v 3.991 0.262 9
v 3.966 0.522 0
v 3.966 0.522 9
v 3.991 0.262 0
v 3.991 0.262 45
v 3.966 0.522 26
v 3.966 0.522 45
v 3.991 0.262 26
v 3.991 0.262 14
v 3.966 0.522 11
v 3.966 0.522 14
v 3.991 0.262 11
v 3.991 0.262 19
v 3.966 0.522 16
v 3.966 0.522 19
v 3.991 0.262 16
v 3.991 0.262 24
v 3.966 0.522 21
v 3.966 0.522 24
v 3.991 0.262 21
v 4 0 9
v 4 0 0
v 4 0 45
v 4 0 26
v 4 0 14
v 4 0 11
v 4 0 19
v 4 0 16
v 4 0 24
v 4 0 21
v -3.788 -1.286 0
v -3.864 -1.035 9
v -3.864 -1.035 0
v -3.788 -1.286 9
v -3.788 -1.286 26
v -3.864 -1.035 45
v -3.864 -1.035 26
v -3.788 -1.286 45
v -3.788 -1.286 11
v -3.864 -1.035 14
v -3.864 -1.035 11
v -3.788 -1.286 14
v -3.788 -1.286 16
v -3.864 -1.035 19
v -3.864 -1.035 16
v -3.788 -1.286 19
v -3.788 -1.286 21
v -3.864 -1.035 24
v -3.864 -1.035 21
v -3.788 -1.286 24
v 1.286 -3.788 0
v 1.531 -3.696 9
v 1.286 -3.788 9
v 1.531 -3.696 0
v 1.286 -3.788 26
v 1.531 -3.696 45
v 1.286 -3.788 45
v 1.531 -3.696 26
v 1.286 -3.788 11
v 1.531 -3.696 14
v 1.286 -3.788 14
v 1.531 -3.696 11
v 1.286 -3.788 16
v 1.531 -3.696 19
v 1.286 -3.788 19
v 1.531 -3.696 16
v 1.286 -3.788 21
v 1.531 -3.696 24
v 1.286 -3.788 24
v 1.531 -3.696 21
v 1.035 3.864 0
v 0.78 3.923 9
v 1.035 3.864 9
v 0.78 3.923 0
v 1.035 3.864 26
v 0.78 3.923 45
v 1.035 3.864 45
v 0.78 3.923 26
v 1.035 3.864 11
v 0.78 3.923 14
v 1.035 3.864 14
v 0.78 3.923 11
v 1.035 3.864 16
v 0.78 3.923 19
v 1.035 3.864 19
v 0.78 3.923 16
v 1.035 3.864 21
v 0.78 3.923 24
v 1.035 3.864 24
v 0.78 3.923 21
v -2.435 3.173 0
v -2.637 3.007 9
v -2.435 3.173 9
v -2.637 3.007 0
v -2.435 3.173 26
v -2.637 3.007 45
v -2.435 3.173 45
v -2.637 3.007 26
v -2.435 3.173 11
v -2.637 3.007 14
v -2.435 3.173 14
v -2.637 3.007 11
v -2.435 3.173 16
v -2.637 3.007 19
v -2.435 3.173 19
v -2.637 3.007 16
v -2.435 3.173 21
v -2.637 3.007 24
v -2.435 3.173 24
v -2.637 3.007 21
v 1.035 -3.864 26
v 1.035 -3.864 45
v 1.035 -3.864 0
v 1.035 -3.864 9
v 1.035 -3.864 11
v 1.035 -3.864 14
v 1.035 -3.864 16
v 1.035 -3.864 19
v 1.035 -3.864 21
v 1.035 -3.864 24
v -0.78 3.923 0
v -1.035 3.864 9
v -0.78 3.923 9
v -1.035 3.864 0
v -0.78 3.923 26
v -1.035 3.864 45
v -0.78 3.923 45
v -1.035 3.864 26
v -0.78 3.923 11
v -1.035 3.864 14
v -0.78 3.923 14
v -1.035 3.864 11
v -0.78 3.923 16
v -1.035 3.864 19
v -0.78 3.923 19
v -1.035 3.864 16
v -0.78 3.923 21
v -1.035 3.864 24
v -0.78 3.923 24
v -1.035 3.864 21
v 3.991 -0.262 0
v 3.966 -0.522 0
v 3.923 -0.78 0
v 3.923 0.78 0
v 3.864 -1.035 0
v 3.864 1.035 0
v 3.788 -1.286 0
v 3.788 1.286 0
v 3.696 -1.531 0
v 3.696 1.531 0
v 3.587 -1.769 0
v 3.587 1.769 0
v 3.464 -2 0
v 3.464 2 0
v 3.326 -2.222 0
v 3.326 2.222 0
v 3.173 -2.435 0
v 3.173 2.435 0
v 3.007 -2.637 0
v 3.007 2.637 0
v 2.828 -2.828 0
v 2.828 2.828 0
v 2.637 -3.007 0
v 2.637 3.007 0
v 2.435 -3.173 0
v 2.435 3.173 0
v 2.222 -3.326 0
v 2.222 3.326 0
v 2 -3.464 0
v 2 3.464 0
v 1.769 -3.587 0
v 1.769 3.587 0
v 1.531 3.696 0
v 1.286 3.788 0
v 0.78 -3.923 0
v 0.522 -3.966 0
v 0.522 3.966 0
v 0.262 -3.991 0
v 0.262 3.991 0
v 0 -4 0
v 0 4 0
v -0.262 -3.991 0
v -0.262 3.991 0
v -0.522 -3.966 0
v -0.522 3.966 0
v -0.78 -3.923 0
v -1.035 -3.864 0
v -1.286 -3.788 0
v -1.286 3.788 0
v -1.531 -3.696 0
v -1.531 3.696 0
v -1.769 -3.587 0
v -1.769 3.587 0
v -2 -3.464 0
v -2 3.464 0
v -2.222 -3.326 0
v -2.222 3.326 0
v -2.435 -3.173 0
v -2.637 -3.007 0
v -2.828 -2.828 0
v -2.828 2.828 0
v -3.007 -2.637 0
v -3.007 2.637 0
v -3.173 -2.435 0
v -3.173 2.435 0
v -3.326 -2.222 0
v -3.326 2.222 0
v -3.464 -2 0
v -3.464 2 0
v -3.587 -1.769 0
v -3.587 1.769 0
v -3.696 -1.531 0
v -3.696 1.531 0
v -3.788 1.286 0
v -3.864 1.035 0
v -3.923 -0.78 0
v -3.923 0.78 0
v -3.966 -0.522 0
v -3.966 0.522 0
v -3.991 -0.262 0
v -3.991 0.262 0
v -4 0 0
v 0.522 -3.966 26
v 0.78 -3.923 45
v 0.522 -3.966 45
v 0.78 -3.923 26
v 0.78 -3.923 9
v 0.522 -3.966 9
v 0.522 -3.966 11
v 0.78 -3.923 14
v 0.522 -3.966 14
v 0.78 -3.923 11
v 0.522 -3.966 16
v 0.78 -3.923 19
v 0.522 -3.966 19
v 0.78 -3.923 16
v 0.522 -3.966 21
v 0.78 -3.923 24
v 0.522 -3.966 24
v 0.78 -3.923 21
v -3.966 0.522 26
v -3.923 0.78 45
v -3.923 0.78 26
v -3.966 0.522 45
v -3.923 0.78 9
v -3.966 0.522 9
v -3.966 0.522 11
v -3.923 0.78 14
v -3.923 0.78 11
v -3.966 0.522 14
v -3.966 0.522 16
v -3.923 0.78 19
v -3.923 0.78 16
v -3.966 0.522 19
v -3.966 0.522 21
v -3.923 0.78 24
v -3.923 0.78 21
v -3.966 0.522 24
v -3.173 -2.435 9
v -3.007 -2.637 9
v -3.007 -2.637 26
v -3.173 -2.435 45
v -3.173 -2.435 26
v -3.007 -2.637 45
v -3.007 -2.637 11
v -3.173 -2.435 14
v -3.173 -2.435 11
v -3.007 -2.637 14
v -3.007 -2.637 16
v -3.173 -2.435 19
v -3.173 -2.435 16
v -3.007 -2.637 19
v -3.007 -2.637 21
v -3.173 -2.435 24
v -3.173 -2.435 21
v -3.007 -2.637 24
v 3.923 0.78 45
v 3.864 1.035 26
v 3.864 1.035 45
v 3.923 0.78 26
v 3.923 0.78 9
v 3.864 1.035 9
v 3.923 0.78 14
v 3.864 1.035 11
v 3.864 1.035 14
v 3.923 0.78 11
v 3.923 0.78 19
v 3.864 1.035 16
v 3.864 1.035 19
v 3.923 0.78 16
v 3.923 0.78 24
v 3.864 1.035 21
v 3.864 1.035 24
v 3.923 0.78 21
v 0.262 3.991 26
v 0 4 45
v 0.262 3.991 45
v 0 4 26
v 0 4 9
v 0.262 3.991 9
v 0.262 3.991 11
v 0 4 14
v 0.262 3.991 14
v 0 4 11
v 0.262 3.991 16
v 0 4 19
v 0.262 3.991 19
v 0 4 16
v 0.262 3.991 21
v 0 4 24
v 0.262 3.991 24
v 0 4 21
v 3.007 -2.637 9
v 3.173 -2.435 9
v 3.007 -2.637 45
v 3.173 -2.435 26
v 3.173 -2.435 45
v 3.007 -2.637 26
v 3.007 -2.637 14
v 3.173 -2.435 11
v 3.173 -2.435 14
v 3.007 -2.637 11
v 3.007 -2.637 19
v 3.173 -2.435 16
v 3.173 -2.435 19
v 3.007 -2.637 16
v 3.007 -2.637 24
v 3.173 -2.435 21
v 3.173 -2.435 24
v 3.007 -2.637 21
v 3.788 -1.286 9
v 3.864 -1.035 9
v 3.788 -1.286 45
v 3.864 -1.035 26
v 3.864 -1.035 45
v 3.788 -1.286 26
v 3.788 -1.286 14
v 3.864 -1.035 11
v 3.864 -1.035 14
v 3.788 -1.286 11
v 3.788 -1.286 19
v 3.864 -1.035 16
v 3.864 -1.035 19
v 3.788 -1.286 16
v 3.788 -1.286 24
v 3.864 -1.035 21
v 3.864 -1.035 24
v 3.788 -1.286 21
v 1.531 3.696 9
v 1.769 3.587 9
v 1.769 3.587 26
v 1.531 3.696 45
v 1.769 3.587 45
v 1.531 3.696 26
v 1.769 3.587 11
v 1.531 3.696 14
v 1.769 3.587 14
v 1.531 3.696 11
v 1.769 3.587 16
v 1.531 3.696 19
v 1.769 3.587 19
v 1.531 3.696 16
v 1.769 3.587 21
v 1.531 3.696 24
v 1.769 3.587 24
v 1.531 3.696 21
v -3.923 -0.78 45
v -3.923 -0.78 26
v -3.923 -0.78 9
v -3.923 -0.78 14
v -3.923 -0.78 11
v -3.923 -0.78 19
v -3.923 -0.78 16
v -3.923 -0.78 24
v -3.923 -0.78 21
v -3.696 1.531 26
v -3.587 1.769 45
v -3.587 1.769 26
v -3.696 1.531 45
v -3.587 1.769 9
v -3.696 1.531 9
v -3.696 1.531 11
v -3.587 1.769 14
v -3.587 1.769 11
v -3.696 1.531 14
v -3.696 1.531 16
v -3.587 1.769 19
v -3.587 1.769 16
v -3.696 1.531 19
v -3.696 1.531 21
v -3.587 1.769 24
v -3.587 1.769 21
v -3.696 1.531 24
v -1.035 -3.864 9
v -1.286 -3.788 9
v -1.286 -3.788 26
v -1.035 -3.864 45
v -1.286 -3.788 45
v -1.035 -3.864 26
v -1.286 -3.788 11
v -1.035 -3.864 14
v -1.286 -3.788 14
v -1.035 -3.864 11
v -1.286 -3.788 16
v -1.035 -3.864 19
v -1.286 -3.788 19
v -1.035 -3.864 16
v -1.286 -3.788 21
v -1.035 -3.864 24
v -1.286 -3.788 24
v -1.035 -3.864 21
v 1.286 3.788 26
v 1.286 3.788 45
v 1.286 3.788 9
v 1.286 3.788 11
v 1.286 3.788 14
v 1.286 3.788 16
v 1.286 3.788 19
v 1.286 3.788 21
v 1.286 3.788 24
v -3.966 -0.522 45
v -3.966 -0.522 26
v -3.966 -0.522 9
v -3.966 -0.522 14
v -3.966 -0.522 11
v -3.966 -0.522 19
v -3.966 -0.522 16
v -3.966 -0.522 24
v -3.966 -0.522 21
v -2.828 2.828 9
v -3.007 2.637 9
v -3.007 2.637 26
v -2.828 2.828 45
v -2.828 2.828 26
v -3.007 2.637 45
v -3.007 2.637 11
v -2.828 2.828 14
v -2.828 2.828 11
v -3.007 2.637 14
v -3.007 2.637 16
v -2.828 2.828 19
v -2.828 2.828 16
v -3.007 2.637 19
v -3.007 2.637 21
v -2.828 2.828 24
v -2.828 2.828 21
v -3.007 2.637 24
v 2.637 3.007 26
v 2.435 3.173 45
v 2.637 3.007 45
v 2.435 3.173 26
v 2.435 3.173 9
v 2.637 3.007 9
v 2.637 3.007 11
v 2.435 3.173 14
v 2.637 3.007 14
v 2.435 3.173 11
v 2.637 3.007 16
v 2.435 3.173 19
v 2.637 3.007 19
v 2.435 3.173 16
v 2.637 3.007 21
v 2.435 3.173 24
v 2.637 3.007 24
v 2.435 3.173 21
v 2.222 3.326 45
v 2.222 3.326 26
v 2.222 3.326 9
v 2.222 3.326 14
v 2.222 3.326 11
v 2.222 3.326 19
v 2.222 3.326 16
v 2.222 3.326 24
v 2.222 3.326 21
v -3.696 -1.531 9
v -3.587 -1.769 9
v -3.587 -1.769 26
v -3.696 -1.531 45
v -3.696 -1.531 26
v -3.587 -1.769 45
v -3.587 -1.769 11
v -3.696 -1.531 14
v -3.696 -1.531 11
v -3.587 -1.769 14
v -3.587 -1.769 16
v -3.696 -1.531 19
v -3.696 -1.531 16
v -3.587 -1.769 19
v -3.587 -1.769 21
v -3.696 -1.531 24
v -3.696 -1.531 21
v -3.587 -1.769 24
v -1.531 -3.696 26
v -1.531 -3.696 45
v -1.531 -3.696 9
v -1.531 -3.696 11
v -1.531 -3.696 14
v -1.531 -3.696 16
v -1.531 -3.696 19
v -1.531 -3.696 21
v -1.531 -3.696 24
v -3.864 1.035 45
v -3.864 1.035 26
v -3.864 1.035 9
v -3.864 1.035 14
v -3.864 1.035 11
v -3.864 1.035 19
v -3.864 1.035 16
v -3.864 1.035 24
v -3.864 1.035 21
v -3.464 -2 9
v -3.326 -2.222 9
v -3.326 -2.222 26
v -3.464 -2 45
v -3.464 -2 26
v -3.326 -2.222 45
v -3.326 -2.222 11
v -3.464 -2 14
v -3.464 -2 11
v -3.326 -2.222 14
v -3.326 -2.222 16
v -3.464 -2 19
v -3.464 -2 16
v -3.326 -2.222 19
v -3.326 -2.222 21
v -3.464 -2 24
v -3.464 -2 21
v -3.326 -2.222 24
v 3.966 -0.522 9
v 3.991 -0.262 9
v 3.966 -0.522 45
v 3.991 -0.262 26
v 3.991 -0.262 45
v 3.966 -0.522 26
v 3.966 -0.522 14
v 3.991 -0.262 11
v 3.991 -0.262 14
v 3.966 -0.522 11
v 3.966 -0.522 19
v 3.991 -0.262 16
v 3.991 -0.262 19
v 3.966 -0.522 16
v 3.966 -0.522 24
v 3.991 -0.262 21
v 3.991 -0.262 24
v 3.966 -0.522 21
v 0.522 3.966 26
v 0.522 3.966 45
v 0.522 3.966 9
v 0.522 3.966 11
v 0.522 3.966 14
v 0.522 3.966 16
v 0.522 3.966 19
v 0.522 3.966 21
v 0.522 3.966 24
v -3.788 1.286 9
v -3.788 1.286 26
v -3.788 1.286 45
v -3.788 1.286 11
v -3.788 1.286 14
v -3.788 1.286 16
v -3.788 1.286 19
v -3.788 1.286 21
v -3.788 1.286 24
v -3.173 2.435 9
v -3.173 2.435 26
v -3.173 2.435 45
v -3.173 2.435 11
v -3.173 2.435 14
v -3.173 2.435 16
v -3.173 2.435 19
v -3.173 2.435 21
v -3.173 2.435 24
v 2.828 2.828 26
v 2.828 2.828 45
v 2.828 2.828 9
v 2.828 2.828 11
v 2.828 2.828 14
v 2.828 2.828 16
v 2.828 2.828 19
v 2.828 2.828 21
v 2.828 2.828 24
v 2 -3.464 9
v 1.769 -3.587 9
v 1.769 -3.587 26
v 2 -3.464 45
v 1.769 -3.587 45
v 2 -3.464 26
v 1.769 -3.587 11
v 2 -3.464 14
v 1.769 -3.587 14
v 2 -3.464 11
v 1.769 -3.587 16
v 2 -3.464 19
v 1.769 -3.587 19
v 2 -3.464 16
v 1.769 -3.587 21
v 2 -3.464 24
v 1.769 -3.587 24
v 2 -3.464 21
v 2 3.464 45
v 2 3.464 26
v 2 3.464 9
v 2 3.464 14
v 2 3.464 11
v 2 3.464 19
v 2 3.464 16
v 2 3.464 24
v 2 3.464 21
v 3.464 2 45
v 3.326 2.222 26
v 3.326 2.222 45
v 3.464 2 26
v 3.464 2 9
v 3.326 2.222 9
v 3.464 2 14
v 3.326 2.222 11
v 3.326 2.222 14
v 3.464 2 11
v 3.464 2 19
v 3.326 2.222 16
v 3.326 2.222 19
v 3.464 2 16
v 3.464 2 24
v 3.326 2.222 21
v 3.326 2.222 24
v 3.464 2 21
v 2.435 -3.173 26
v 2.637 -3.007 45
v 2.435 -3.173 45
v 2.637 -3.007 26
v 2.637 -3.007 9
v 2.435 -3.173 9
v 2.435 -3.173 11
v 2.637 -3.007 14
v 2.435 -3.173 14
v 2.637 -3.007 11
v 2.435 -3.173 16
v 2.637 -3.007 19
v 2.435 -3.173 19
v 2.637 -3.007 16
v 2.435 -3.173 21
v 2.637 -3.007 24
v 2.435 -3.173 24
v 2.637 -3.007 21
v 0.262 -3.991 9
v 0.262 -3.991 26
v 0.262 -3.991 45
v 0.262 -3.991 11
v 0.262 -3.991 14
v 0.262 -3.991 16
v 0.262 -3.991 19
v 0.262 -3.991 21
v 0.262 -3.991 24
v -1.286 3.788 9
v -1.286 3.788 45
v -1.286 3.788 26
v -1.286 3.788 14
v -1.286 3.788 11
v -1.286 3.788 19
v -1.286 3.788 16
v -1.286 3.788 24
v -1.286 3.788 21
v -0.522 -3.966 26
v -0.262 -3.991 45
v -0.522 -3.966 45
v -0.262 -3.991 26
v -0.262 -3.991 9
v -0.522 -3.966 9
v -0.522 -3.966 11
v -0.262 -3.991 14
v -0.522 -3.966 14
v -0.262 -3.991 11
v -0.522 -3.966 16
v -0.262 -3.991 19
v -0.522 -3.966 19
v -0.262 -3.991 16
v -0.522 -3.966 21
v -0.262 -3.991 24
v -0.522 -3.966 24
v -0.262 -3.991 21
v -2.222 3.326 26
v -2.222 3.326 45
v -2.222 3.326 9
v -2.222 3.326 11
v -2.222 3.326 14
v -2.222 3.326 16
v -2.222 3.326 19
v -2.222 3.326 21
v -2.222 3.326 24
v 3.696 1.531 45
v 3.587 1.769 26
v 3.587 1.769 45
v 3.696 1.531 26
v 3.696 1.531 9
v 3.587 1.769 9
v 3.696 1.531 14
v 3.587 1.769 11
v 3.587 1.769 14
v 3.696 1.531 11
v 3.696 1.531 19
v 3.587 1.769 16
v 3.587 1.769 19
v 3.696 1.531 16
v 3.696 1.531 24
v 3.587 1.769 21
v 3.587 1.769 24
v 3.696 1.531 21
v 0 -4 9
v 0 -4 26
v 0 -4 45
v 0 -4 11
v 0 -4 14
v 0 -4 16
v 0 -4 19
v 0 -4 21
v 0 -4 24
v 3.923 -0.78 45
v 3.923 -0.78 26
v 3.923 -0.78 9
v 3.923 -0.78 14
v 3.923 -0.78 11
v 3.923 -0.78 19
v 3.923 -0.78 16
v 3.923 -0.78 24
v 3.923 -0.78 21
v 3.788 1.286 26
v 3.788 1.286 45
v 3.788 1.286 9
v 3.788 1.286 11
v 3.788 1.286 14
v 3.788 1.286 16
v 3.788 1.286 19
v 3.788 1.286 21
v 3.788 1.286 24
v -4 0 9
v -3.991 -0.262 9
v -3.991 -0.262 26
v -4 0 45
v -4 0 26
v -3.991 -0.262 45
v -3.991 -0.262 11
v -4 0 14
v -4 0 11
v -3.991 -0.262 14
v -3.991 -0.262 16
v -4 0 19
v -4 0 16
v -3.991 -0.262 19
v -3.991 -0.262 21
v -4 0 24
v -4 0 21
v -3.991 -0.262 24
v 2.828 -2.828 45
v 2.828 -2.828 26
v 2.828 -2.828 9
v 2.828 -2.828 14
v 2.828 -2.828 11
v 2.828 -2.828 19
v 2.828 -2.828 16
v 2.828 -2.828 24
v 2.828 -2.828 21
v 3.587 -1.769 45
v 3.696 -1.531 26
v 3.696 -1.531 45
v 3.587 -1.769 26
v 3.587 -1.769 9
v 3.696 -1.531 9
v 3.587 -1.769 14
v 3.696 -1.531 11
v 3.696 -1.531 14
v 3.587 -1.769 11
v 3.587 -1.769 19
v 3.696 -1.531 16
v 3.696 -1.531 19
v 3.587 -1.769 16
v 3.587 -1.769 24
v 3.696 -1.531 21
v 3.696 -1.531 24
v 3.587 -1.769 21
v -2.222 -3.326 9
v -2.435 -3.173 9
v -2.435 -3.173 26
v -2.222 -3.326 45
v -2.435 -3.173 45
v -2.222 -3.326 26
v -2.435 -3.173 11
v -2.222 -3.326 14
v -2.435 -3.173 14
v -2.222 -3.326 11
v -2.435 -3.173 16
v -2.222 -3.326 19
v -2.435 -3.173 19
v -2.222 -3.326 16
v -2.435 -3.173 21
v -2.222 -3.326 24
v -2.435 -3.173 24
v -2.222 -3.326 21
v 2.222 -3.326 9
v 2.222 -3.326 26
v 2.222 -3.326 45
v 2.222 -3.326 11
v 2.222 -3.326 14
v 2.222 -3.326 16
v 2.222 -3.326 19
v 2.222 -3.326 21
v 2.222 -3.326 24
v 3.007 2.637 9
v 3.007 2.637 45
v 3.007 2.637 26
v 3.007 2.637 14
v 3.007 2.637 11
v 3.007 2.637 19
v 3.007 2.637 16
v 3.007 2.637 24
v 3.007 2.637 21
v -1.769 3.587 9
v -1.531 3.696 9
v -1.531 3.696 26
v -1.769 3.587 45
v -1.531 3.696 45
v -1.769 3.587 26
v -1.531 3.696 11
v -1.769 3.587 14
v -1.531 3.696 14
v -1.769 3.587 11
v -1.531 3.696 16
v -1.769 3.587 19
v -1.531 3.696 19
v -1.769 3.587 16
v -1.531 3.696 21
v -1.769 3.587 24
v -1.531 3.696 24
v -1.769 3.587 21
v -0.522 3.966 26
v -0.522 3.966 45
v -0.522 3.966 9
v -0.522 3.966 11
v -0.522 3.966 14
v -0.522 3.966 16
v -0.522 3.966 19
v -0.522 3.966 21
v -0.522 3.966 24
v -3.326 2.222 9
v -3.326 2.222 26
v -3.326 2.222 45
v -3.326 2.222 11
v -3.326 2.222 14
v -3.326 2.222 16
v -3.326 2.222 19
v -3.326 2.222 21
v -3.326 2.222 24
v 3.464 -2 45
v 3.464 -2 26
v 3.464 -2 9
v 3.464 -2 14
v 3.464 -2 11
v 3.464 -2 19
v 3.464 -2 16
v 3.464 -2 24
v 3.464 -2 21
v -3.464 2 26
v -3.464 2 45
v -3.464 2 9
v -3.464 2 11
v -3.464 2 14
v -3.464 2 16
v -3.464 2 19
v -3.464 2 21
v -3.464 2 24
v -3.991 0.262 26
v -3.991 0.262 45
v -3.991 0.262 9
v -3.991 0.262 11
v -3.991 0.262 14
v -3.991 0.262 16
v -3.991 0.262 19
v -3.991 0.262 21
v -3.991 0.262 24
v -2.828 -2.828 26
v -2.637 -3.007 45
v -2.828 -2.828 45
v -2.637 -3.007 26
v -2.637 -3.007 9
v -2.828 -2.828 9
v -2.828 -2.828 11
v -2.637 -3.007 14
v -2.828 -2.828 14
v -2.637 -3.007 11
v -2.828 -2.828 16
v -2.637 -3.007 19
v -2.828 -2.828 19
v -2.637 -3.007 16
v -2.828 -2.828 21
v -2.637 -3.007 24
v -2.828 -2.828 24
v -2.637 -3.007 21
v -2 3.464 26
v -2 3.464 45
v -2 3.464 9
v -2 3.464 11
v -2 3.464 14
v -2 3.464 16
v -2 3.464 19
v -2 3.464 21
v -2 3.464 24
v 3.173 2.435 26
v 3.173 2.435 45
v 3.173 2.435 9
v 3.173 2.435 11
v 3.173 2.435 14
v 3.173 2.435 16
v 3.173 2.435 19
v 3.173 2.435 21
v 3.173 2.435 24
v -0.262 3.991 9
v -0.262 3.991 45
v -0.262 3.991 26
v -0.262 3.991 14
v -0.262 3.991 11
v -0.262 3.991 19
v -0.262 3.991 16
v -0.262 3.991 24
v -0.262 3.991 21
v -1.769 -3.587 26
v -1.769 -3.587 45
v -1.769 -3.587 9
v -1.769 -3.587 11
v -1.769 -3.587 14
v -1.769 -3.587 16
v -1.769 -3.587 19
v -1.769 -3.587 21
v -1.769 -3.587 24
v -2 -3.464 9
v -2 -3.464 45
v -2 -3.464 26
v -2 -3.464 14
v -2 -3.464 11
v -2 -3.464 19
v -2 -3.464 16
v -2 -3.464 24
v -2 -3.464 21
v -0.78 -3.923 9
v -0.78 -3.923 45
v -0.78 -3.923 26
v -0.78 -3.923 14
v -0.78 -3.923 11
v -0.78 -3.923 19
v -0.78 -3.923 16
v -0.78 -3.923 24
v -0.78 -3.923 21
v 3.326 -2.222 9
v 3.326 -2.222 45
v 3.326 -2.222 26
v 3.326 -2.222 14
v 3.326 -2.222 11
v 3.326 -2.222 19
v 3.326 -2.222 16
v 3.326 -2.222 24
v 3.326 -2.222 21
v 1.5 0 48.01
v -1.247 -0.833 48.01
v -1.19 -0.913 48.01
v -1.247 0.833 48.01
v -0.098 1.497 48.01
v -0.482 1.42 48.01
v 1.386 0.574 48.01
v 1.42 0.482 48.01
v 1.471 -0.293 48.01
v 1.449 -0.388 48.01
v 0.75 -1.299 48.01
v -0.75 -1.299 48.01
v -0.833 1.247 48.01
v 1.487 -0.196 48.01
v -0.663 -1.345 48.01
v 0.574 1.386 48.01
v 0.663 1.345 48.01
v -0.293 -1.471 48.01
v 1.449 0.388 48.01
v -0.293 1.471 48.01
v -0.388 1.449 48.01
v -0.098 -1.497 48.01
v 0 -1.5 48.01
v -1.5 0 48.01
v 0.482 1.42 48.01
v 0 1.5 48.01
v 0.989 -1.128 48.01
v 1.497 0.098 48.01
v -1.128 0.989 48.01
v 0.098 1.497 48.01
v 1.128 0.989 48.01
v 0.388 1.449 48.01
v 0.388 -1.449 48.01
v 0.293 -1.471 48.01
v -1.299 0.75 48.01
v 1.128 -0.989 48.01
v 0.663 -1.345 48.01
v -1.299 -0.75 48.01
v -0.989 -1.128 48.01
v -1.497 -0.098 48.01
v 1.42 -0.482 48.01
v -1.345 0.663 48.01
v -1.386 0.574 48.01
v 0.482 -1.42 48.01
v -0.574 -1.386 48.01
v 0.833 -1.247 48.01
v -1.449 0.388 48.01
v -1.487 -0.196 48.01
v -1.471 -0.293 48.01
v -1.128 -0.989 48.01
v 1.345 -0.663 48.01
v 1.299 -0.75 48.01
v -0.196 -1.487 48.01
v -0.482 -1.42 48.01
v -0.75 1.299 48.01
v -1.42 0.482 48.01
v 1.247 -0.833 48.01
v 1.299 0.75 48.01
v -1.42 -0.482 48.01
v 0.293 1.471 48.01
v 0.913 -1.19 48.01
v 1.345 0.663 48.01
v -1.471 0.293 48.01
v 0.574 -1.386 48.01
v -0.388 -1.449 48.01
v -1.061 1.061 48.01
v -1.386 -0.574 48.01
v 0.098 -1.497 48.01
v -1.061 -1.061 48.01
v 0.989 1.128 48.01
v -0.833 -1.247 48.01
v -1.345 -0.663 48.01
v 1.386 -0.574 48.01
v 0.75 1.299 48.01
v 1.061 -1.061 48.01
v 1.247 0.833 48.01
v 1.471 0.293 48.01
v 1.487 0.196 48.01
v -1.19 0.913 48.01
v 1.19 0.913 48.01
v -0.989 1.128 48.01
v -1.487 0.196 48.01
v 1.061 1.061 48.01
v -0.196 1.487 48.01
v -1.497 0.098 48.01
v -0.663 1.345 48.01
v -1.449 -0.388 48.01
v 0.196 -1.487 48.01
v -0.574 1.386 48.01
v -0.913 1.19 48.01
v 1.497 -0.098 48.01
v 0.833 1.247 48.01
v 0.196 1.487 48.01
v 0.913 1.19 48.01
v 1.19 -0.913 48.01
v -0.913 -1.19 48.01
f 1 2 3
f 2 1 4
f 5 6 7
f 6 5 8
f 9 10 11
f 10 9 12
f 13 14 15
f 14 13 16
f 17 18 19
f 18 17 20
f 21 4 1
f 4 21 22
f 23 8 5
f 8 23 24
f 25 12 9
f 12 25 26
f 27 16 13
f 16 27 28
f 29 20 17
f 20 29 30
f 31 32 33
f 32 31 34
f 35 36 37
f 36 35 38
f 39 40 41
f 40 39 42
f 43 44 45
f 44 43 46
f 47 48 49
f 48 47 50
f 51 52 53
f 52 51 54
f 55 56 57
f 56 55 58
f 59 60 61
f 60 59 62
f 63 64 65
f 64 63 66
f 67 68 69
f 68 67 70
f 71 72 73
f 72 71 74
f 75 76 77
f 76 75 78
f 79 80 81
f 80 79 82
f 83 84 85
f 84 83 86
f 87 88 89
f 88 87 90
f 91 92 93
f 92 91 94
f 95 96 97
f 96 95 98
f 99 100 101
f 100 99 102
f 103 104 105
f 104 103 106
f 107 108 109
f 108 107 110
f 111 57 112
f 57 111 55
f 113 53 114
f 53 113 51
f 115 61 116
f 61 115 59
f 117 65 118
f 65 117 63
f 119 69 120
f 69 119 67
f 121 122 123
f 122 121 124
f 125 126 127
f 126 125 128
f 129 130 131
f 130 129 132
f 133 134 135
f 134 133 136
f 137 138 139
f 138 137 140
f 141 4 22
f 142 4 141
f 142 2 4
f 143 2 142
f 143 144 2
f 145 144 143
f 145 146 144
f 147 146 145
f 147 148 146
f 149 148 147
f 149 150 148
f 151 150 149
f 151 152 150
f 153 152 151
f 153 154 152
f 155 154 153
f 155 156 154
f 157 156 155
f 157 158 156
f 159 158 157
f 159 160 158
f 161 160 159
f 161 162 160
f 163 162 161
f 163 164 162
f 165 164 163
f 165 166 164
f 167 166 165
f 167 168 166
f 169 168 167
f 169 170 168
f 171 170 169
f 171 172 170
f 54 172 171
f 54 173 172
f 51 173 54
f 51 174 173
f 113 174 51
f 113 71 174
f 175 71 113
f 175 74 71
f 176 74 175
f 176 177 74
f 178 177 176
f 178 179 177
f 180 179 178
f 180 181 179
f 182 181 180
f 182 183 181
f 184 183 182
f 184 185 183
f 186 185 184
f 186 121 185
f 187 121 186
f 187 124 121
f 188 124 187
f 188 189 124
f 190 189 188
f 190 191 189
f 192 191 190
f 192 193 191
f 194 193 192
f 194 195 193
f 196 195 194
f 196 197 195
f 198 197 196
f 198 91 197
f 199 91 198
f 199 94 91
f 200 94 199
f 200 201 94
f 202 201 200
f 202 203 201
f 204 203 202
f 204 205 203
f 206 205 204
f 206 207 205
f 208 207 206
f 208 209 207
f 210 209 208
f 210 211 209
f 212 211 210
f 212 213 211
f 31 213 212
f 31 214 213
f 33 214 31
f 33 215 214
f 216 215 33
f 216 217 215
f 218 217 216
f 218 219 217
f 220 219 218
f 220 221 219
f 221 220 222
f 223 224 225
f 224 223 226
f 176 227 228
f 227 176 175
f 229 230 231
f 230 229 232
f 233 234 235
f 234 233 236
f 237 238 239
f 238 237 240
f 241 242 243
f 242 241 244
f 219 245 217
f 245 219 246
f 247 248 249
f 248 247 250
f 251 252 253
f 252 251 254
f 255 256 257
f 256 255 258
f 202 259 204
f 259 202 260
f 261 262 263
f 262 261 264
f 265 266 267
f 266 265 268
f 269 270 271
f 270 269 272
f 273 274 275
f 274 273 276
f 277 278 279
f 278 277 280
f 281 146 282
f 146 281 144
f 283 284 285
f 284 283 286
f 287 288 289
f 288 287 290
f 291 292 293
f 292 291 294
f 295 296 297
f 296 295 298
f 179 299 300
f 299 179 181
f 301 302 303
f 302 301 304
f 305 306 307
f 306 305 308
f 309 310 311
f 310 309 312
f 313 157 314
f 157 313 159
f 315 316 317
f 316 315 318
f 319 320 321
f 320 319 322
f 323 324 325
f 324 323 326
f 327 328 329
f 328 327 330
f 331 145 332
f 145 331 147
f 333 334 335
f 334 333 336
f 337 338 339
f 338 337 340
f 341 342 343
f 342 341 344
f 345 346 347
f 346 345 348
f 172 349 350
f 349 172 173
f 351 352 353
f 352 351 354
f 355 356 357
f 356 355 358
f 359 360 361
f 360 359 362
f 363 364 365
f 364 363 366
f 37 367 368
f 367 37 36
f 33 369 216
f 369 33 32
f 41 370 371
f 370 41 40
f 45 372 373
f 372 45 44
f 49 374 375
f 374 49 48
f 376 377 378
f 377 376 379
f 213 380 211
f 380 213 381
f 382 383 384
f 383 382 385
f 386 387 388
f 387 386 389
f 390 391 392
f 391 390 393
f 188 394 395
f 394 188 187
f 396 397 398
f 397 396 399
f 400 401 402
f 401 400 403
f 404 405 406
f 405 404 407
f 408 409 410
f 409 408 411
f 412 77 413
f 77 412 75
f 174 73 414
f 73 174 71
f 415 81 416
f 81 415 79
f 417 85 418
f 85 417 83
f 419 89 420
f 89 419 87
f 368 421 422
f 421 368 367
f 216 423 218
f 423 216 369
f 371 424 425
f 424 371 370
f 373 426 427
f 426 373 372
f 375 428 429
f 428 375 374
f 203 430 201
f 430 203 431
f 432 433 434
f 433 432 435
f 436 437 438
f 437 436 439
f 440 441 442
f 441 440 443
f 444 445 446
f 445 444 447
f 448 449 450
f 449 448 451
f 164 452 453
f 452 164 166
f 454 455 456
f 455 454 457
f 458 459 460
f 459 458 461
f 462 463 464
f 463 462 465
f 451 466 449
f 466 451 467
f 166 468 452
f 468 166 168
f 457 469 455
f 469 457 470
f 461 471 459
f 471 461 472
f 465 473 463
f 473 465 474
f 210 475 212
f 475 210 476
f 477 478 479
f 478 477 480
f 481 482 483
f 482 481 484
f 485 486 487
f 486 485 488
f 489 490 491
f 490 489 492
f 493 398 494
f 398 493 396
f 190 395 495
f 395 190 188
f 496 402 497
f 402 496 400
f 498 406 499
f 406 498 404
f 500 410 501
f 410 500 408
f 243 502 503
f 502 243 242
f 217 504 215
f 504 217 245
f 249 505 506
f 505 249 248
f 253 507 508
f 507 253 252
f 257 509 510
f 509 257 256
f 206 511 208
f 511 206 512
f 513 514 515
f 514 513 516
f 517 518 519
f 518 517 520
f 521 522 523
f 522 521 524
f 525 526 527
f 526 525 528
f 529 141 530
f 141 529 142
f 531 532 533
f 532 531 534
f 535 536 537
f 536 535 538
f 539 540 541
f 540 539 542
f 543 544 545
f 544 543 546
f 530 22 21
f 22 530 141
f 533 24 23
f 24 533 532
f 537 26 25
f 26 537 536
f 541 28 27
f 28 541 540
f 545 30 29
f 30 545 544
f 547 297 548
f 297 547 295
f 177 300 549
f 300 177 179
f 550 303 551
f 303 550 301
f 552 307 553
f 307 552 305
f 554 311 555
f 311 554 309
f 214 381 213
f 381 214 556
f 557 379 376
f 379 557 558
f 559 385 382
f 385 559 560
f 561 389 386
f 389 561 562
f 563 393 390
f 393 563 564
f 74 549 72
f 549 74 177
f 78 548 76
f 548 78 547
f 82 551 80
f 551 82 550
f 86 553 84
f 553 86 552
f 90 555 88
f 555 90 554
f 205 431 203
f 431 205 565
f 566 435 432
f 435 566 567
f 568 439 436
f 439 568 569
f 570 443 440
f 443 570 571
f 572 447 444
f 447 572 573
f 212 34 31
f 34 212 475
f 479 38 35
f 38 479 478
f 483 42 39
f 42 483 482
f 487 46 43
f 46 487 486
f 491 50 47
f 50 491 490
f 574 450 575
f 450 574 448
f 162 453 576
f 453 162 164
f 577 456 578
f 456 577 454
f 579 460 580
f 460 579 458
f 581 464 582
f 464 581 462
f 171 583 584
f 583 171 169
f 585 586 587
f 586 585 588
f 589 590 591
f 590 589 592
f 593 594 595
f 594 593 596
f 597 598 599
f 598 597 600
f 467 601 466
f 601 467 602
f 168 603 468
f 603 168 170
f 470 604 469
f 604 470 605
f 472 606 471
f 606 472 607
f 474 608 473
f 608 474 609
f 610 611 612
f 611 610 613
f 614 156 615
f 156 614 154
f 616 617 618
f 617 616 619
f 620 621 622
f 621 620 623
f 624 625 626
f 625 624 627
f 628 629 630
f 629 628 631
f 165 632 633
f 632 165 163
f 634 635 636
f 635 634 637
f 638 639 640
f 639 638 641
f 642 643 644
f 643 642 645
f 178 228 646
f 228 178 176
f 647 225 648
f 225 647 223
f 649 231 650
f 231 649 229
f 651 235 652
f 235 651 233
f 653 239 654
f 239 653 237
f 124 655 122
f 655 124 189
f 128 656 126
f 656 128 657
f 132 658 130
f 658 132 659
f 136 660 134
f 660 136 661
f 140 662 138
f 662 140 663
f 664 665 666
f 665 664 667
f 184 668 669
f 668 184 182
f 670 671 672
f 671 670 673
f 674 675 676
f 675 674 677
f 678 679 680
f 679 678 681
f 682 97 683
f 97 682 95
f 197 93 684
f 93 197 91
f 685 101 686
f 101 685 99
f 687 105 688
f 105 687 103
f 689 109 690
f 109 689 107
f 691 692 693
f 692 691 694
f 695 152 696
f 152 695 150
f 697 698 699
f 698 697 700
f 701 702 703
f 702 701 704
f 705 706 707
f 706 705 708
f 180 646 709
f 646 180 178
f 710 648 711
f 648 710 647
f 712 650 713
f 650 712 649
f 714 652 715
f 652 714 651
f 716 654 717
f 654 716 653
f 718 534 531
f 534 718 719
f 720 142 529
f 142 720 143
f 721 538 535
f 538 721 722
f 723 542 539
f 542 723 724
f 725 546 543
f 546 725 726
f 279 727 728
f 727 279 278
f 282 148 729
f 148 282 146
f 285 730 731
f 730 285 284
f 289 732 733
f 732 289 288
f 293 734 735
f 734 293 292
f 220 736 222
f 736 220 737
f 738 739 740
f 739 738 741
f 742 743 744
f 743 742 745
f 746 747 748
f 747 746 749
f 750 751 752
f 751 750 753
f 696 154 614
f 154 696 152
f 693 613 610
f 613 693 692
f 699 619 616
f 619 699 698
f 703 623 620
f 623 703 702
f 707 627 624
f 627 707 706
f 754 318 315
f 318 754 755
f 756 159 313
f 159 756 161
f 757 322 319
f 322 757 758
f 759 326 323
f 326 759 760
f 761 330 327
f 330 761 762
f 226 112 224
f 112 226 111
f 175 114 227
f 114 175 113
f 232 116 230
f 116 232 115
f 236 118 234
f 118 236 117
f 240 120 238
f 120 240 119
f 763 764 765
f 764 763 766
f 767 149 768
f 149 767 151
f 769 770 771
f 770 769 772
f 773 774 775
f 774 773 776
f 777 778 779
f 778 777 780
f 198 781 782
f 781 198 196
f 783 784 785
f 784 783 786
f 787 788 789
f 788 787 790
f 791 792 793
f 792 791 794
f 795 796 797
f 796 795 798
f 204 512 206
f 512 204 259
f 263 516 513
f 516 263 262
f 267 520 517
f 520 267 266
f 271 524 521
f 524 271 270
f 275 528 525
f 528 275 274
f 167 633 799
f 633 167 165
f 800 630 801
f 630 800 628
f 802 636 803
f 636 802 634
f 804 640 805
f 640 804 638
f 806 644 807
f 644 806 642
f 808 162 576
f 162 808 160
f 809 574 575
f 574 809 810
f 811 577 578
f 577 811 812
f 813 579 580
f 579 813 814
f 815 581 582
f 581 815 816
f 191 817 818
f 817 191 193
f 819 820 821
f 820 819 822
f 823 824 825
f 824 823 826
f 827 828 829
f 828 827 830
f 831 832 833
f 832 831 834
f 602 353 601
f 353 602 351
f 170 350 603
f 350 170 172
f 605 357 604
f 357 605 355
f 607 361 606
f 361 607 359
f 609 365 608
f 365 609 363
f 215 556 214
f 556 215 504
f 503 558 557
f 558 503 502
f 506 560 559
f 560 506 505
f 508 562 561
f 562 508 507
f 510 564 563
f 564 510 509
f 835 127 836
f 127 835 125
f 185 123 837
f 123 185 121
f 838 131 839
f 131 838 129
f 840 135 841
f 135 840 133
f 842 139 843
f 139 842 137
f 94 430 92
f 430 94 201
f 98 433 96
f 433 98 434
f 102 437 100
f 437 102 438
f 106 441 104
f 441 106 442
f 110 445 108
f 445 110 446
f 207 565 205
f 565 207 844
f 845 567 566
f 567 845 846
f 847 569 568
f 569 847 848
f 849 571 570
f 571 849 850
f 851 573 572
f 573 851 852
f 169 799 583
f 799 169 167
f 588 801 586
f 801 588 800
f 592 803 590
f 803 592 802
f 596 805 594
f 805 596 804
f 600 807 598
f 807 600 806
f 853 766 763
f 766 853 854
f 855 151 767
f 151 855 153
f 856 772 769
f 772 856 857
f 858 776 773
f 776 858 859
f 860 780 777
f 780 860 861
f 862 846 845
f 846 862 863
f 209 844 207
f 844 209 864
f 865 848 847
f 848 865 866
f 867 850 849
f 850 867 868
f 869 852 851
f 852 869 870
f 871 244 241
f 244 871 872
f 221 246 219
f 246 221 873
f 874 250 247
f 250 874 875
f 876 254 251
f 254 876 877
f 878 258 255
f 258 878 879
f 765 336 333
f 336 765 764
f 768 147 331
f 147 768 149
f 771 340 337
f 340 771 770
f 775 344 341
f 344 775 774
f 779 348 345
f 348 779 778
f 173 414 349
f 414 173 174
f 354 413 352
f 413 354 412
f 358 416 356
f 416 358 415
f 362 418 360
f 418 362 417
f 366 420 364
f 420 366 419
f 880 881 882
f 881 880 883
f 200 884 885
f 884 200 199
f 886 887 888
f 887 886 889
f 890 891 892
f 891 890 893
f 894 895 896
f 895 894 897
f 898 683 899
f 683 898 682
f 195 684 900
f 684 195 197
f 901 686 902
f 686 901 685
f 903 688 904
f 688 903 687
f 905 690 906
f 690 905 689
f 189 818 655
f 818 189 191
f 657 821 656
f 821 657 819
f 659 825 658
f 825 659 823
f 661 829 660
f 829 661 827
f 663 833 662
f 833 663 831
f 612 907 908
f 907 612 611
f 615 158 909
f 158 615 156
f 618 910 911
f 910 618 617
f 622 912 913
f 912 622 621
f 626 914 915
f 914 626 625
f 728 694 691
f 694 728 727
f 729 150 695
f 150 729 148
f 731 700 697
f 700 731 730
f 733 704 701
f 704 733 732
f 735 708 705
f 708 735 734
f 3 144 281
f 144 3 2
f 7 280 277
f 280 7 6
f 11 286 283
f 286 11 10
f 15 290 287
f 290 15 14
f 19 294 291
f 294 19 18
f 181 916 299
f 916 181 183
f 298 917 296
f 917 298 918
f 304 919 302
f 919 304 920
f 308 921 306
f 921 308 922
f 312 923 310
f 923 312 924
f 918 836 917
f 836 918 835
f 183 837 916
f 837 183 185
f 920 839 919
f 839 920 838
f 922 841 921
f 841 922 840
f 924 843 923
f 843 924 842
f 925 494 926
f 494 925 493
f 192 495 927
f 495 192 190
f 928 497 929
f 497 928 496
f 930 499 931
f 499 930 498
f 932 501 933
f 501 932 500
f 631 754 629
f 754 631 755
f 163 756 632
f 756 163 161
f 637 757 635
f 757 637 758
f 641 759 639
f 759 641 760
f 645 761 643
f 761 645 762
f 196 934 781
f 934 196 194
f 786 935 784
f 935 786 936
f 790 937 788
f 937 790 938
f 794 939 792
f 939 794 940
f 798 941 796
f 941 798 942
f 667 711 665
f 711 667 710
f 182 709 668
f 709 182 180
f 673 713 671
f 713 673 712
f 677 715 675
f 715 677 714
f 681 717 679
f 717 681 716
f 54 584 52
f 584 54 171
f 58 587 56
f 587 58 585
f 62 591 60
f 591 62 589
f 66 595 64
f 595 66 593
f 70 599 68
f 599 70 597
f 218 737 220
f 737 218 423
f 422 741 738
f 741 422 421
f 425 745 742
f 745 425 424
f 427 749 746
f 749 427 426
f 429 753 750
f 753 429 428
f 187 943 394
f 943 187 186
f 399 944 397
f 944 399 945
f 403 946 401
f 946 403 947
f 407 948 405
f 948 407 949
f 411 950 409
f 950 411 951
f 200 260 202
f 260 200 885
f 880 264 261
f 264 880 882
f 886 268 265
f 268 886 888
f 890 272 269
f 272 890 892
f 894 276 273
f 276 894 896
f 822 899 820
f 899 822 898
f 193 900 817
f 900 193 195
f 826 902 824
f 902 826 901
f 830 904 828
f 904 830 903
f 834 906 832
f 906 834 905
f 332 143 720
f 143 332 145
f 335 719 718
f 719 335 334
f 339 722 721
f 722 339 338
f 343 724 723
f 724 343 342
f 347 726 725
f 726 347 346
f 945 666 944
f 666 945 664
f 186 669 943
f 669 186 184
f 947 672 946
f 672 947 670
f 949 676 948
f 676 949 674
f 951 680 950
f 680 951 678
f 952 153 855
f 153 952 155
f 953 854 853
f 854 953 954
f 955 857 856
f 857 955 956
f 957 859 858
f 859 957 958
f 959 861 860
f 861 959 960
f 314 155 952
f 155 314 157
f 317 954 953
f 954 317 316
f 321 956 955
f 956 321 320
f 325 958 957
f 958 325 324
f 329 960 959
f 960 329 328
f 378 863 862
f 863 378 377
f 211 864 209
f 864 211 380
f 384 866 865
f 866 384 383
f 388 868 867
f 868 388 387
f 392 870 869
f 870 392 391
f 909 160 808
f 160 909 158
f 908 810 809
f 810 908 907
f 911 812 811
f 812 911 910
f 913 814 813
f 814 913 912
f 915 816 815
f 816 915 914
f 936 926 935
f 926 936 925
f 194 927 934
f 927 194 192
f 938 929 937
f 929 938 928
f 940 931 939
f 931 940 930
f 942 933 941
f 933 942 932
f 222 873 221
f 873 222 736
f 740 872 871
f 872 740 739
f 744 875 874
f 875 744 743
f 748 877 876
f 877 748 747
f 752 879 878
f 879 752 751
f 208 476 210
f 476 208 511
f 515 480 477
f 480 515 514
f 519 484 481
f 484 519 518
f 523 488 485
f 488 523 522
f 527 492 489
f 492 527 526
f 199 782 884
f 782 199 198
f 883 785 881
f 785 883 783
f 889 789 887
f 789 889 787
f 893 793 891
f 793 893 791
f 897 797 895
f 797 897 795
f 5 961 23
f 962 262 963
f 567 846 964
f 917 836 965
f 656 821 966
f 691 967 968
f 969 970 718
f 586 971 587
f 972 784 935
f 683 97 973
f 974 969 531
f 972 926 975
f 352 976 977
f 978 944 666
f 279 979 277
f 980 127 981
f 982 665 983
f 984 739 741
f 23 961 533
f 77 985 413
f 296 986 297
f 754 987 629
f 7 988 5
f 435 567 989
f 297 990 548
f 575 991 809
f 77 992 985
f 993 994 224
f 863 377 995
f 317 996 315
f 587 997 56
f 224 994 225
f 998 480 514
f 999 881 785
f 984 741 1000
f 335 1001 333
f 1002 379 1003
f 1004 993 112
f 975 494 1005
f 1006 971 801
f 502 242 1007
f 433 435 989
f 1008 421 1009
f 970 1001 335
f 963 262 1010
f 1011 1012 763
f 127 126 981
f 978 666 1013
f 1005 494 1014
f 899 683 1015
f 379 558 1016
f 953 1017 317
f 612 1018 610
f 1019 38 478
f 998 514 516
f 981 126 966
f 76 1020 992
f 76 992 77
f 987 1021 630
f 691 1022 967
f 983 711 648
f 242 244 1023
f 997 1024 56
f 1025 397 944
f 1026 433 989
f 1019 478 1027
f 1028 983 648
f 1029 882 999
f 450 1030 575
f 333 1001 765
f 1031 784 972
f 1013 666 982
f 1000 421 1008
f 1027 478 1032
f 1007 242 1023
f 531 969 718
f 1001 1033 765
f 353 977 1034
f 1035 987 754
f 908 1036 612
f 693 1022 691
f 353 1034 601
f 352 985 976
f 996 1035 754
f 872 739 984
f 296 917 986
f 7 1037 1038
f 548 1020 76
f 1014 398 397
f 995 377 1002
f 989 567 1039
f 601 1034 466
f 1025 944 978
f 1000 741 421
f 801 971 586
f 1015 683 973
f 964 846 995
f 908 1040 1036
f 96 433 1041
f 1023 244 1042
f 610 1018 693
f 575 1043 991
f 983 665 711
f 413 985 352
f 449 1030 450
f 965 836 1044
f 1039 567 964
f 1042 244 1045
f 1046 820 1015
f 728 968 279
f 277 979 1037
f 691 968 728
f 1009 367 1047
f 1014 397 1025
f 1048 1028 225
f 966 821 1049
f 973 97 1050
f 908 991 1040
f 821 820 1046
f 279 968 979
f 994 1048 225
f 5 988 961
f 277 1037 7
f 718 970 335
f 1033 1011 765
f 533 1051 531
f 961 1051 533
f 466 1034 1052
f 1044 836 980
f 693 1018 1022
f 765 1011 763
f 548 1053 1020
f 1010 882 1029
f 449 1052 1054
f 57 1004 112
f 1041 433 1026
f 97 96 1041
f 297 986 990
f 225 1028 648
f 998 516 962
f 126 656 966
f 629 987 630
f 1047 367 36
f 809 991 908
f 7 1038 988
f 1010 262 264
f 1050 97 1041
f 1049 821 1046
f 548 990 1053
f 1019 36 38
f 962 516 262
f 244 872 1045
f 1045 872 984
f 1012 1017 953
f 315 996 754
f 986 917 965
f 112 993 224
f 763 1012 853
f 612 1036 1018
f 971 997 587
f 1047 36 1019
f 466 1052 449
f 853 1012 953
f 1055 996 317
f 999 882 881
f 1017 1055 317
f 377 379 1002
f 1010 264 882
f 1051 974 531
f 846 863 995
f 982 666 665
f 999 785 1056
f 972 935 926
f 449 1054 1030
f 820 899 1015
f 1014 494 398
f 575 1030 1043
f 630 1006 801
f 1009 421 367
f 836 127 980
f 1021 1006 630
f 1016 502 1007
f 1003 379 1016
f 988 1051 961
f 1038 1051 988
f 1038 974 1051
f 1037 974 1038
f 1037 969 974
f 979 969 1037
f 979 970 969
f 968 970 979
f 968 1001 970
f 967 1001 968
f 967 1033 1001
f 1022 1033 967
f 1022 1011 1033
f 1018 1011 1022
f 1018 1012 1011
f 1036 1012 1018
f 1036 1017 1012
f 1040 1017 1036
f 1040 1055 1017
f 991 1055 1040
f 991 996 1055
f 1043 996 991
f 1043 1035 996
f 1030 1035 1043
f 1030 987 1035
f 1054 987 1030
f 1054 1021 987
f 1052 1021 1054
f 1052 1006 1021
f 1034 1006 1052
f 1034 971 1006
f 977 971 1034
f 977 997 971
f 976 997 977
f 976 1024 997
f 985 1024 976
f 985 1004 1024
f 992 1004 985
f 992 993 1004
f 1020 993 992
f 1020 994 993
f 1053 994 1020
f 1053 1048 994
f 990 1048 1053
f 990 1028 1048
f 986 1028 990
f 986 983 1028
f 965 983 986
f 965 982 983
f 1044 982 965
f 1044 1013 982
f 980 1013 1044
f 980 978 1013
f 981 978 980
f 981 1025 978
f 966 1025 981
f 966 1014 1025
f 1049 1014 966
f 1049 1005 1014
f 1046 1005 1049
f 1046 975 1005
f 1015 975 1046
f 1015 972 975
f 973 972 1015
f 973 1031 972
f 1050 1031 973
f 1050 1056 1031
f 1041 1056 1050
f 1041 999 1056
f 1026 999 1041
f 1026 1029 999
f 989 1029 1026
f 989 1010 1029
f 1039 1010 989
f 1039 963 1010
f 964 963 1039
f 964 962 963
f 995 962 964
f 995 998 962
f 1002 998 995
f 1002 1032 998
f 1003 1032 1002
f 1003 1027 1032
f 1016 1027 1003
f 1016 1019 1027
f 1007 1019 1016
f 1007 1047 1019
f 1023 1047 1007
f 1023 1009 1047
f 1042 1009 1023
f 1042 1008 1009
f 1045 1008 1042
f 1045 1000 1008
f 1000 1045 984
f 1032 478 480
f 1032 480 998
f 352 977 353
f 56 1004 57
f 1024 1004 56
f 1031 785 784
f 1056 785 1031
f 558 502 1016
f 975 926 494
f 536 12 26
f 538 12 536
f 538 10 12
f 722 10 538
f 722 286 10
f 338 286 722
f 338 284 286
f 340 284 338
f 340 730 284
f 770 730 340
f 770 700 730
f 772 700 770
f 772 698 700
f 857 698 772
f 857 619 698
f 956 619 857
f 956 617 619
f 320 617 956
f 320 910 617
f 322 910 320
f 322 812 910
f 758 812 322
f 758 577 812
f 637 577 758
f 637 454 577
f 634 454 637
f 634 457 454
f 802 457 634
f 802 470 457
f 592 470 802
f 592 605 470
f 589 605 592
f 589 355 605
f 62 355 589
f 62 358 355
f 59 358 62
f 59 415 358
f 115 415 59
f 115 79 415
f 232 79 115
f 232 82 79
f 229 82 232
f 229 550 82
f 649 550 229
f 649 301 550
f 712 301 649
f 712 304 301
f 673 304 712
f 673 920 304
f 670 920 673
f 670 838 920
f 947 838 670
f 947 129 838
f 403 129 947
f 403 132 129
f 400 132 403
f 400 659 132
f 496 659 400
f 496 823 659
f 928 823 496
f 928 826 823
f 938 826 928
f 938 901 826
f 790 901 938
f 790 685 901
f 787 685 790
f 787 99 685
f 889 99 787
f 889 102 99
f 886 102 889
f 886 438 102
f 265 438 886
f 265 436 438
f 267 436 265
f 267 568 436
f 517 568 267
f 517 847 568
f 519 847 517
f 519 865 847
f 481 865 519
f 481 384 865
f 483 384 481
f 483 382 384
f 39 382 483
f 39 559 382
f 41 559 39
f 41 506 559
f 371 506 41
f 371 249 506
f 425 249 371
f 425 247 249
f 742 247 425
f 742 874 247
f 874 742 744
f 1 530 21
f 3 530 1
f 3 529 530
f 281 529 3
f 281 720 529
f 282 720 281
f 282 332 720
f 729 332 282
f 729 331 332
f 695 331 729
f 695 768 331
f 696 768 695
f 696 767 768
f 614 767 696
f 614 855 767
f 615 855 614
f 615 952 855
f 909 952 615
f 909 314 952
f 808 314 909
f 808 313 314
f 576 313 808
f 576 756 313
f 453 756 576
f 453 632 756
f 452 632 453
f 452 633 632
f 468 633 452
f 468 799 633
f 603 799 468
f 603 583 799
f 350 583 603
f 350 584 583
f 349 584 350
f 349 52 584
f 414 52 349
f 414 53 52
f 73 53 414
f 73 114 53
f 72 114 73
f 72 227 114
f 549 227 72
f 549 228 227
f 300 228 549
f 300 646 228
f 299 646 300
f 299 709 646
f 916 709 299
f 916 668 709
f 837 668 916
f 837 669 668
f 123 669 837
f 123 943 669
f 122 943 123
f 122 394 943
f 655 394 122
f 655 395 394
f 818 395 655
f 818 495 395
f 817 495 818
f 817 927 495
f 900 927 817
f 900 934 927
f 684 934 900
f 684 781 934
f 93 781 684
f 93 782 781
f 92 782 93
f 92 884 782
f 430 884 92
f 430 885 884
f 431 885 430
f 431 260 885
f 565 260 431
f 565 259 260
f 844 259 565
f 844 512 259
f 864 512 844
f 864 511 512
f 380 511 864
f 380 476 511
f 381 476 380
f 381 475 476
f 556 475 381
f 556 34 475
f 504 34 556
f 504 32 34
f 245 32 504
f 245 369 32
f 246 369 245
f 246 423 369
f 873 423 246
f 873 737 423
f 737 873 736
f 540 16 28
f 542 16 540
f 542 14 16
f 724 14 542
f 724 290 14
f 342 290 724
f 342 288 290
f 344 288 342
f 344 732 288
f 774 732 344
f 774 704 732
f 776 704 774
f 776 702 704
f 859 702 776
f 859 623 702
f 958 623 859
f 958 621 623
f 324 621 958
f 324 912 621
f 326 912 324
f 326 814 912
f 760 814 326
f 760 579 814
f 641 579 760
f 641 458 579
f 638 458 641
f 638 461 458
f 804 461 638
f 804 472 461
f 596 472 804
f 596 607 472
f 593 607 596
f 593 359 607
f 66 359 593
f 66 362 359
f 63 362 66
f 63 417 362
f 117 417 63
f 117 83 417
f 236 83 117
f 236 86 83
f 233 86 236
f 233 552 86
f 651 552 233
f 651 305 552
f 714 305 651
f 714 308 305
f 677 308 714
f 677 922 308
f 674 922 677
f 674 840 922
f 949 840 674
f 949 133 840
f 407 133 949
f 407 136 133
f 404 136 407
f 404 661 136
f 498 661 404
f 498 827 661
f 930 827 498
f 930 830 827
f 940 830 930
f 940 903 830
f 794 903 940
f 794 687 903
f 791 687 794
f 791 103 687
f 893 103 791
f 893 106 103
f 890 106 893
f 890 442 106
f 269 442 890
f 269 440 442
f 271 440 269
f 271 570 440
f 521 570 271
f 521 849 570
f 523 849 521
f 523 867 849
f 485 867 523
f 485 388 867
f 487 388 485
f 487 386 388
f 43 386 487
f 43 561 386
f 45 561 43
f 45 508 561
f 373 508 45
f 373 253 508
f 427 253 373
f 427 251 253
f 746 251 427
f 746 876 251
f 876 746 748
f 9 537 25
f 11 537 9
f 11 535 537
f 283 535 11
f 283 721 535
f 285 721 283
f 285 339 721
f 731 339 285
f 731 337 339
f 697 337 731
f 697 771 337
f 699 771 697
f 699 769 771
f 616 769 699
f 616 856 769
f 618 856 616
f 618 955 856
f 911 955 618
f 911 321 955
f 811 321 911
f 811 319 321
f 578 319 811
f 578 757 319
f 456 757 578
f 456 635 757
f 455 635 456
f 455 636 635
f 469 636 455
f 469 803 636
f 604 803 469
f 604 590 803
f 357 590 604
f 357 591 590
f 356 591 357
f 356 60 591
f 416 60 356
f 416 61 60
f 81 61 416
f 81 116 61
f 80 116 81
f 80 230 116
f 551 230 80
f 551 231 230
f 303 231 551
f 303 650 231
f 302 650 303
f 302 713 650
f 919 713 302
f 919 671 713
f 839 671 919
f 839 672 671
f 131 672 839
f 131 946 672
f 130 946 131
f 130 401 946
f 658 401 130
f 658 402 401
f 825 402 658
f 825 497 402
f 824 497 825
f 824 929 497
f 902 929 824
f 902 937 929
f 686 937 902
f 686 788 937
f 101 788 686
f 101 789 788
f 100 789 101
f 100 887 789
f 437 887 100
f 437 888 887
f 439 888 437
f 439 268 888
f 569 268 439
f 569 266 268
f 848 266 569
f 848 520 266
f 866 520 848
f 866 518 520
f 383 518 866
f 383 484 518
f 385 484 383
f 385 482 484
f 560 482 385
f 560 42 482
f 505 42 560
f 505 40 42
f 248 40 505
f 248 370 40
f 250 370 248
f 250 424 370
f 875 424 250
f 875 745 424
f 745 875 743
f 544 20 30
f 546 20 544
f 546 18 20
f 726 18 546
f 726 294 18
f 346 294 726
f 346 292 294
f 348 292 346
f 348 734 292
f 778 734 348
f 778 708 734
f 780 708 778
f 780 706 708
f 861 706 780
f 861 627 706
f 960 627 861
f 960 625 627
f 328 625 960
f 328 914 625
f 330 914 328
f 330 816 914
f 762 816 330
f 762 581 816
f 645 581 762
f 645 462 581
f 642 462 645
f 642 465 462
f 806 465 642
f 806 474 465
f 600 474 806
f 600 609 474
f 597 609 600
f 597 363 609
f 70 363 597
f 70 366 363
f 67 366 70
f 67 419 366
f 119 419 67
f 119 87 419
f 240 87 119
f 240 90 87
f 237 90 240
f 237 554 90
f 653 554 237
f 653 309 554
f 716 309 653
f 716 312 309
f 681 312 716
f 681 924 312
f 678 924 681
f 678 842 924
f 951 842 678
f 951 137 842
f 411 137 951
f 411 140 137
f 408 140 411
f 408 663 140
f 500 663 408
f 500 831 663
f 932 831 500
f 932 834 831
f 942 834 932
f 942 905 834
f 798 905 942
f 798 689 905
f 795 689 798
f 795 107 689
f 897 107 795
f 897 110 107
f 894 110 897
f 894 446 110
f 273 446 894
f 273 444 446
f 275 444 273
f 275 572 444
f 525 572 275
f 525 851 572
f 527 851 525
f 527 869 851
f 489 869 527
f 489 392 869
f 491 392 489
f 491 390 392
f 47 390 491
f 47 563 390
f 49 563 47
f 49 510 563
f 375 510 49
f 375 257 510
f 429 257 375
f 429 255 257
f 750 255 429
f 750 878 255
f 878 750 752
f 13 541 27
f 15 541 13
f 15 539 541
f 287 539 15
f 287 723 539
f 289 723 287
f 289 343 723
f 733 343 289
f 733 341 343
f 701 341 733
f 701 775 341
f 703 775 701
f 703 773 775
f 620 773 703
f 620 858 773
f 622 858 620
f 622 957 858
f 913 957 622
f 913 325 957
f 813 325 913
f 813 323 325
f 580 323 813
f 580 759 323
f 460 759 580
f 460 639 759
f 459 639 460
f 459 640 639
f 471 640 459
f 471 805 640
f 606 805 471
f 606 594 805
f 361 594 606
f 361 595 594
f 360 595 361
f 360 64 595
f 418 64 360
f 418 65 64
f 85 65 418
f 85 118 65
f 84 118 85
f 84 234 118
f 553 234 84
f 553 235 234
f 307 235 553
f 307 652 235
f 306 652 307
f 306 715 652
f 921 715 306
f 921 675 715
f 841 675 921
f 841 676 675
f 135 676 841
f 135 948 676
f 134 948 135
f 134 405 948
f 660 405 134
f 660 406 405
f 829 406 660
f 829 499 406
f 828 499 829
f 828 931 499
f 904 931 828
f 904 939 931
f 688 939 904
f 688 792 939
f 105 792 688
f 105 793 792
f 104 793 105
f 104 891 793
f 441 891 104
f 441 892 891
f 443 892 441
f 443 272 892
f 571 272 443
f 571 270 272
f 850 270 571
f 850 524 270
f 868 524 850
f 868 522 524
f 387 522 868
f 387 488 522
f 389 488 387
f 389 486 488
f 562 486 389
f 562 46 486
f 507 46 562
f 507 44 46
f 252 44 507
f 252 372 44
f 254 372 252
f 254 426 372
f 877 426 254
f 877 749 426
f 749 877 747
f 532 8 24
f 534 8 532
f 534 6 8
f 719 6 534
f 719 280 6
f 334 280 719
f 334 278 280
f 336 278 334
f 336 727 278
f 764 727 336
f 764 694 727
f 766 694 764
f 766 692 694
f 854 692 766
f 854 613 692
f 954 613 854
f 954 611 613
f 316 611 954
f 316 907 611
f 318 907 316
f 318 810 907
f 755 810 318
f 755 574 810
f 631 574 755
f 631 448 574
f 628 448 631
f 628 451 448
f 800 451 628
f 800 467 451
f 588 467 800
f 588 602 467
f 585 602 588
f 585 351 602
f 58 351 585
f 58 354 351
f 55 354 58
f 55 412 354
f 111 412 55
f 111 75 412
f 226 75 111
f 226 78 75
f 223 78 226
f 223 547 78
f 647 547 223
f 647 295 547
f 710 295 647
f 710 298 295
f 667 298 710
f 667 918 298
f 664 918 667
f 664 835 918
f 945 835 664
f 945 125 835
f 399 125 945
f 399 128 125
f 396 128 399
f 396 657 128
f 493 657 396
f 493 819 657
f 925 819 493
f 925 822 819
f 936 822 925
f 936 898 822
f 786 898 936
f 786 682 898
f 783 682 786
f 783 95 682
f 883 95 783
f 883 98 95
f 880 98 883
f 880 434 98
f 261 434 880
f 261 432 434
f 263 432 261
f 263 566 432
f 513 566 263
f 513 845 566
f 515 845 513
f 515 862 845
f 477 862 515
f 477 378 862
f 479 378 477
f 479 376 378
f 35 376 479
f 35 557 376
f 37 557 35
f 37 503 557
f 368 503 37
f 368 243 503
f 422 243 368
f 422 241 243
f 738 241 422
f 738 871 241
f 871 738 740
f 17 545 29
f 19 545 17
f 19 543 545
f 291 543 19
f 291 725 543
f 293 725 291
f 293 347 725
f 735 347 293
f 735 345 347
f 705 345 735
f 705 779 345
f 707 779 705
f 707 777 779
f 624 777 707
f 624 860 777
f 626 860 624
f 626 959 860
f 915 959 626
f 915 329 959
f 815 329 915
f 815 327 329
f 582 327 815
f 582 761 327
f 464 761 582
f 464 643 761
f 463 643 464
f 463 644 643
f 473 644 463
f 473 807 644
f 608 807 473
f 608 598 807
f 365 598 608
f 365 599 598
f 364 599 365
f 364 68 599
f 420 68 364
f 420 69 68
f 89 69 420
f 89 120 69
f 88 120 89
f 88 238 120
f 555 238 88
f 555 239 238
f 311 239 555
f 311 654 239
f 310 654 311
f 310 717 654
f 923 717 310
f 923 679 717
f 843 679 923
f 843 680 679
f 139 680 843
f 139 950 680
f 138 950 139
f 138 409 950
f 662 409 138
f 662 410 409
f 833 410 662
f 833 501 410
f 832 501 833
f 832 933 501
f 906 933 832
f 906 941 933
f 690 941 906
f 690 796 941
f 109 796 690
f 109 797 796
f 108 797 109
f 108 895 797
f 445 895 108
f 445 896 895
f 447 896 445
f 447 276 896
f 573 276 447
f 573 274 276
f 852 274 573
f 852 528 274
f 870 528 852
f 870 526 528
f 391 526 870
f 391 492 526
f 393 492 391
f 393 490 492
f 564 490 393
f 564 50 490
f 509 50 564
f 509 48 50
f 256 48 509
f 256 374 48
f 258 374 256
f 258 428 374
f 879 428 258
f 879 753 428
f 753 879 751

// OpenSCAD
// Pestle for grinding tissue inside a 1.5 mL microcentrifuge tube
// Printed standing upright: handle at the bottom, tip at the top.
//
// Dimensions (mm):
//   handle_d      = 8.00   // handle diameter
//   handle_h      = 45.00  // handle height (z = 0 to 45)
//   cone_bottom_d = 3.00   // cone diameter at z = 62
//   sphere_d      = 3.00   // tip sphere diameter
//   groove_count  = 4      // number of circumferential grooves
//   groove_w      = 2.00   // groove width in Z
//   groove_depth  = 1.00   // groove depth from surface
//   groove_z      = [10, 15, 20, 25] // groove centre heights

// ---------------- Parameters ----------------
handle_d      = 8.0;
handle_h      = 45.0;
cone_bottom_d = 3.0;
sphere_d      = 3.0;
groove_count  = 4;
groove_w      = 2.0;
groove_depth  = 1.0;
groove_z      = [10, 15, 20, 25];

eps = 0.5;      // cutter overshoot past faces (mm)

$fn = 96;

// ---------------- Model ----------------
difference() {
    union() {
        // (1) Cylindrical handle: z = 0 to 45
        cylinder(d = handle_d, h = handle_h);

        // (2) Cone: z = 45 to 62, 8 mm -> 3 mm diameter
        translate([0, 0, handle_h])
            cylinder(d1 = handle_d, d2 = cone_bottom_d, h = sphere_d + 0.01);

        // (3) Rounded tip: sphere centred at z = 62
        translate([0, 0, handle_h + sphere_d / 2])
            sphere(d = sphere_d);
    }

    // Grip grooves
    for (z = groove_z)
        translate([0, 0, z - groove_w / 2])
            cylinder(d = handle_d + 2 * eps, h = groove_w, $fn = 96);
}
